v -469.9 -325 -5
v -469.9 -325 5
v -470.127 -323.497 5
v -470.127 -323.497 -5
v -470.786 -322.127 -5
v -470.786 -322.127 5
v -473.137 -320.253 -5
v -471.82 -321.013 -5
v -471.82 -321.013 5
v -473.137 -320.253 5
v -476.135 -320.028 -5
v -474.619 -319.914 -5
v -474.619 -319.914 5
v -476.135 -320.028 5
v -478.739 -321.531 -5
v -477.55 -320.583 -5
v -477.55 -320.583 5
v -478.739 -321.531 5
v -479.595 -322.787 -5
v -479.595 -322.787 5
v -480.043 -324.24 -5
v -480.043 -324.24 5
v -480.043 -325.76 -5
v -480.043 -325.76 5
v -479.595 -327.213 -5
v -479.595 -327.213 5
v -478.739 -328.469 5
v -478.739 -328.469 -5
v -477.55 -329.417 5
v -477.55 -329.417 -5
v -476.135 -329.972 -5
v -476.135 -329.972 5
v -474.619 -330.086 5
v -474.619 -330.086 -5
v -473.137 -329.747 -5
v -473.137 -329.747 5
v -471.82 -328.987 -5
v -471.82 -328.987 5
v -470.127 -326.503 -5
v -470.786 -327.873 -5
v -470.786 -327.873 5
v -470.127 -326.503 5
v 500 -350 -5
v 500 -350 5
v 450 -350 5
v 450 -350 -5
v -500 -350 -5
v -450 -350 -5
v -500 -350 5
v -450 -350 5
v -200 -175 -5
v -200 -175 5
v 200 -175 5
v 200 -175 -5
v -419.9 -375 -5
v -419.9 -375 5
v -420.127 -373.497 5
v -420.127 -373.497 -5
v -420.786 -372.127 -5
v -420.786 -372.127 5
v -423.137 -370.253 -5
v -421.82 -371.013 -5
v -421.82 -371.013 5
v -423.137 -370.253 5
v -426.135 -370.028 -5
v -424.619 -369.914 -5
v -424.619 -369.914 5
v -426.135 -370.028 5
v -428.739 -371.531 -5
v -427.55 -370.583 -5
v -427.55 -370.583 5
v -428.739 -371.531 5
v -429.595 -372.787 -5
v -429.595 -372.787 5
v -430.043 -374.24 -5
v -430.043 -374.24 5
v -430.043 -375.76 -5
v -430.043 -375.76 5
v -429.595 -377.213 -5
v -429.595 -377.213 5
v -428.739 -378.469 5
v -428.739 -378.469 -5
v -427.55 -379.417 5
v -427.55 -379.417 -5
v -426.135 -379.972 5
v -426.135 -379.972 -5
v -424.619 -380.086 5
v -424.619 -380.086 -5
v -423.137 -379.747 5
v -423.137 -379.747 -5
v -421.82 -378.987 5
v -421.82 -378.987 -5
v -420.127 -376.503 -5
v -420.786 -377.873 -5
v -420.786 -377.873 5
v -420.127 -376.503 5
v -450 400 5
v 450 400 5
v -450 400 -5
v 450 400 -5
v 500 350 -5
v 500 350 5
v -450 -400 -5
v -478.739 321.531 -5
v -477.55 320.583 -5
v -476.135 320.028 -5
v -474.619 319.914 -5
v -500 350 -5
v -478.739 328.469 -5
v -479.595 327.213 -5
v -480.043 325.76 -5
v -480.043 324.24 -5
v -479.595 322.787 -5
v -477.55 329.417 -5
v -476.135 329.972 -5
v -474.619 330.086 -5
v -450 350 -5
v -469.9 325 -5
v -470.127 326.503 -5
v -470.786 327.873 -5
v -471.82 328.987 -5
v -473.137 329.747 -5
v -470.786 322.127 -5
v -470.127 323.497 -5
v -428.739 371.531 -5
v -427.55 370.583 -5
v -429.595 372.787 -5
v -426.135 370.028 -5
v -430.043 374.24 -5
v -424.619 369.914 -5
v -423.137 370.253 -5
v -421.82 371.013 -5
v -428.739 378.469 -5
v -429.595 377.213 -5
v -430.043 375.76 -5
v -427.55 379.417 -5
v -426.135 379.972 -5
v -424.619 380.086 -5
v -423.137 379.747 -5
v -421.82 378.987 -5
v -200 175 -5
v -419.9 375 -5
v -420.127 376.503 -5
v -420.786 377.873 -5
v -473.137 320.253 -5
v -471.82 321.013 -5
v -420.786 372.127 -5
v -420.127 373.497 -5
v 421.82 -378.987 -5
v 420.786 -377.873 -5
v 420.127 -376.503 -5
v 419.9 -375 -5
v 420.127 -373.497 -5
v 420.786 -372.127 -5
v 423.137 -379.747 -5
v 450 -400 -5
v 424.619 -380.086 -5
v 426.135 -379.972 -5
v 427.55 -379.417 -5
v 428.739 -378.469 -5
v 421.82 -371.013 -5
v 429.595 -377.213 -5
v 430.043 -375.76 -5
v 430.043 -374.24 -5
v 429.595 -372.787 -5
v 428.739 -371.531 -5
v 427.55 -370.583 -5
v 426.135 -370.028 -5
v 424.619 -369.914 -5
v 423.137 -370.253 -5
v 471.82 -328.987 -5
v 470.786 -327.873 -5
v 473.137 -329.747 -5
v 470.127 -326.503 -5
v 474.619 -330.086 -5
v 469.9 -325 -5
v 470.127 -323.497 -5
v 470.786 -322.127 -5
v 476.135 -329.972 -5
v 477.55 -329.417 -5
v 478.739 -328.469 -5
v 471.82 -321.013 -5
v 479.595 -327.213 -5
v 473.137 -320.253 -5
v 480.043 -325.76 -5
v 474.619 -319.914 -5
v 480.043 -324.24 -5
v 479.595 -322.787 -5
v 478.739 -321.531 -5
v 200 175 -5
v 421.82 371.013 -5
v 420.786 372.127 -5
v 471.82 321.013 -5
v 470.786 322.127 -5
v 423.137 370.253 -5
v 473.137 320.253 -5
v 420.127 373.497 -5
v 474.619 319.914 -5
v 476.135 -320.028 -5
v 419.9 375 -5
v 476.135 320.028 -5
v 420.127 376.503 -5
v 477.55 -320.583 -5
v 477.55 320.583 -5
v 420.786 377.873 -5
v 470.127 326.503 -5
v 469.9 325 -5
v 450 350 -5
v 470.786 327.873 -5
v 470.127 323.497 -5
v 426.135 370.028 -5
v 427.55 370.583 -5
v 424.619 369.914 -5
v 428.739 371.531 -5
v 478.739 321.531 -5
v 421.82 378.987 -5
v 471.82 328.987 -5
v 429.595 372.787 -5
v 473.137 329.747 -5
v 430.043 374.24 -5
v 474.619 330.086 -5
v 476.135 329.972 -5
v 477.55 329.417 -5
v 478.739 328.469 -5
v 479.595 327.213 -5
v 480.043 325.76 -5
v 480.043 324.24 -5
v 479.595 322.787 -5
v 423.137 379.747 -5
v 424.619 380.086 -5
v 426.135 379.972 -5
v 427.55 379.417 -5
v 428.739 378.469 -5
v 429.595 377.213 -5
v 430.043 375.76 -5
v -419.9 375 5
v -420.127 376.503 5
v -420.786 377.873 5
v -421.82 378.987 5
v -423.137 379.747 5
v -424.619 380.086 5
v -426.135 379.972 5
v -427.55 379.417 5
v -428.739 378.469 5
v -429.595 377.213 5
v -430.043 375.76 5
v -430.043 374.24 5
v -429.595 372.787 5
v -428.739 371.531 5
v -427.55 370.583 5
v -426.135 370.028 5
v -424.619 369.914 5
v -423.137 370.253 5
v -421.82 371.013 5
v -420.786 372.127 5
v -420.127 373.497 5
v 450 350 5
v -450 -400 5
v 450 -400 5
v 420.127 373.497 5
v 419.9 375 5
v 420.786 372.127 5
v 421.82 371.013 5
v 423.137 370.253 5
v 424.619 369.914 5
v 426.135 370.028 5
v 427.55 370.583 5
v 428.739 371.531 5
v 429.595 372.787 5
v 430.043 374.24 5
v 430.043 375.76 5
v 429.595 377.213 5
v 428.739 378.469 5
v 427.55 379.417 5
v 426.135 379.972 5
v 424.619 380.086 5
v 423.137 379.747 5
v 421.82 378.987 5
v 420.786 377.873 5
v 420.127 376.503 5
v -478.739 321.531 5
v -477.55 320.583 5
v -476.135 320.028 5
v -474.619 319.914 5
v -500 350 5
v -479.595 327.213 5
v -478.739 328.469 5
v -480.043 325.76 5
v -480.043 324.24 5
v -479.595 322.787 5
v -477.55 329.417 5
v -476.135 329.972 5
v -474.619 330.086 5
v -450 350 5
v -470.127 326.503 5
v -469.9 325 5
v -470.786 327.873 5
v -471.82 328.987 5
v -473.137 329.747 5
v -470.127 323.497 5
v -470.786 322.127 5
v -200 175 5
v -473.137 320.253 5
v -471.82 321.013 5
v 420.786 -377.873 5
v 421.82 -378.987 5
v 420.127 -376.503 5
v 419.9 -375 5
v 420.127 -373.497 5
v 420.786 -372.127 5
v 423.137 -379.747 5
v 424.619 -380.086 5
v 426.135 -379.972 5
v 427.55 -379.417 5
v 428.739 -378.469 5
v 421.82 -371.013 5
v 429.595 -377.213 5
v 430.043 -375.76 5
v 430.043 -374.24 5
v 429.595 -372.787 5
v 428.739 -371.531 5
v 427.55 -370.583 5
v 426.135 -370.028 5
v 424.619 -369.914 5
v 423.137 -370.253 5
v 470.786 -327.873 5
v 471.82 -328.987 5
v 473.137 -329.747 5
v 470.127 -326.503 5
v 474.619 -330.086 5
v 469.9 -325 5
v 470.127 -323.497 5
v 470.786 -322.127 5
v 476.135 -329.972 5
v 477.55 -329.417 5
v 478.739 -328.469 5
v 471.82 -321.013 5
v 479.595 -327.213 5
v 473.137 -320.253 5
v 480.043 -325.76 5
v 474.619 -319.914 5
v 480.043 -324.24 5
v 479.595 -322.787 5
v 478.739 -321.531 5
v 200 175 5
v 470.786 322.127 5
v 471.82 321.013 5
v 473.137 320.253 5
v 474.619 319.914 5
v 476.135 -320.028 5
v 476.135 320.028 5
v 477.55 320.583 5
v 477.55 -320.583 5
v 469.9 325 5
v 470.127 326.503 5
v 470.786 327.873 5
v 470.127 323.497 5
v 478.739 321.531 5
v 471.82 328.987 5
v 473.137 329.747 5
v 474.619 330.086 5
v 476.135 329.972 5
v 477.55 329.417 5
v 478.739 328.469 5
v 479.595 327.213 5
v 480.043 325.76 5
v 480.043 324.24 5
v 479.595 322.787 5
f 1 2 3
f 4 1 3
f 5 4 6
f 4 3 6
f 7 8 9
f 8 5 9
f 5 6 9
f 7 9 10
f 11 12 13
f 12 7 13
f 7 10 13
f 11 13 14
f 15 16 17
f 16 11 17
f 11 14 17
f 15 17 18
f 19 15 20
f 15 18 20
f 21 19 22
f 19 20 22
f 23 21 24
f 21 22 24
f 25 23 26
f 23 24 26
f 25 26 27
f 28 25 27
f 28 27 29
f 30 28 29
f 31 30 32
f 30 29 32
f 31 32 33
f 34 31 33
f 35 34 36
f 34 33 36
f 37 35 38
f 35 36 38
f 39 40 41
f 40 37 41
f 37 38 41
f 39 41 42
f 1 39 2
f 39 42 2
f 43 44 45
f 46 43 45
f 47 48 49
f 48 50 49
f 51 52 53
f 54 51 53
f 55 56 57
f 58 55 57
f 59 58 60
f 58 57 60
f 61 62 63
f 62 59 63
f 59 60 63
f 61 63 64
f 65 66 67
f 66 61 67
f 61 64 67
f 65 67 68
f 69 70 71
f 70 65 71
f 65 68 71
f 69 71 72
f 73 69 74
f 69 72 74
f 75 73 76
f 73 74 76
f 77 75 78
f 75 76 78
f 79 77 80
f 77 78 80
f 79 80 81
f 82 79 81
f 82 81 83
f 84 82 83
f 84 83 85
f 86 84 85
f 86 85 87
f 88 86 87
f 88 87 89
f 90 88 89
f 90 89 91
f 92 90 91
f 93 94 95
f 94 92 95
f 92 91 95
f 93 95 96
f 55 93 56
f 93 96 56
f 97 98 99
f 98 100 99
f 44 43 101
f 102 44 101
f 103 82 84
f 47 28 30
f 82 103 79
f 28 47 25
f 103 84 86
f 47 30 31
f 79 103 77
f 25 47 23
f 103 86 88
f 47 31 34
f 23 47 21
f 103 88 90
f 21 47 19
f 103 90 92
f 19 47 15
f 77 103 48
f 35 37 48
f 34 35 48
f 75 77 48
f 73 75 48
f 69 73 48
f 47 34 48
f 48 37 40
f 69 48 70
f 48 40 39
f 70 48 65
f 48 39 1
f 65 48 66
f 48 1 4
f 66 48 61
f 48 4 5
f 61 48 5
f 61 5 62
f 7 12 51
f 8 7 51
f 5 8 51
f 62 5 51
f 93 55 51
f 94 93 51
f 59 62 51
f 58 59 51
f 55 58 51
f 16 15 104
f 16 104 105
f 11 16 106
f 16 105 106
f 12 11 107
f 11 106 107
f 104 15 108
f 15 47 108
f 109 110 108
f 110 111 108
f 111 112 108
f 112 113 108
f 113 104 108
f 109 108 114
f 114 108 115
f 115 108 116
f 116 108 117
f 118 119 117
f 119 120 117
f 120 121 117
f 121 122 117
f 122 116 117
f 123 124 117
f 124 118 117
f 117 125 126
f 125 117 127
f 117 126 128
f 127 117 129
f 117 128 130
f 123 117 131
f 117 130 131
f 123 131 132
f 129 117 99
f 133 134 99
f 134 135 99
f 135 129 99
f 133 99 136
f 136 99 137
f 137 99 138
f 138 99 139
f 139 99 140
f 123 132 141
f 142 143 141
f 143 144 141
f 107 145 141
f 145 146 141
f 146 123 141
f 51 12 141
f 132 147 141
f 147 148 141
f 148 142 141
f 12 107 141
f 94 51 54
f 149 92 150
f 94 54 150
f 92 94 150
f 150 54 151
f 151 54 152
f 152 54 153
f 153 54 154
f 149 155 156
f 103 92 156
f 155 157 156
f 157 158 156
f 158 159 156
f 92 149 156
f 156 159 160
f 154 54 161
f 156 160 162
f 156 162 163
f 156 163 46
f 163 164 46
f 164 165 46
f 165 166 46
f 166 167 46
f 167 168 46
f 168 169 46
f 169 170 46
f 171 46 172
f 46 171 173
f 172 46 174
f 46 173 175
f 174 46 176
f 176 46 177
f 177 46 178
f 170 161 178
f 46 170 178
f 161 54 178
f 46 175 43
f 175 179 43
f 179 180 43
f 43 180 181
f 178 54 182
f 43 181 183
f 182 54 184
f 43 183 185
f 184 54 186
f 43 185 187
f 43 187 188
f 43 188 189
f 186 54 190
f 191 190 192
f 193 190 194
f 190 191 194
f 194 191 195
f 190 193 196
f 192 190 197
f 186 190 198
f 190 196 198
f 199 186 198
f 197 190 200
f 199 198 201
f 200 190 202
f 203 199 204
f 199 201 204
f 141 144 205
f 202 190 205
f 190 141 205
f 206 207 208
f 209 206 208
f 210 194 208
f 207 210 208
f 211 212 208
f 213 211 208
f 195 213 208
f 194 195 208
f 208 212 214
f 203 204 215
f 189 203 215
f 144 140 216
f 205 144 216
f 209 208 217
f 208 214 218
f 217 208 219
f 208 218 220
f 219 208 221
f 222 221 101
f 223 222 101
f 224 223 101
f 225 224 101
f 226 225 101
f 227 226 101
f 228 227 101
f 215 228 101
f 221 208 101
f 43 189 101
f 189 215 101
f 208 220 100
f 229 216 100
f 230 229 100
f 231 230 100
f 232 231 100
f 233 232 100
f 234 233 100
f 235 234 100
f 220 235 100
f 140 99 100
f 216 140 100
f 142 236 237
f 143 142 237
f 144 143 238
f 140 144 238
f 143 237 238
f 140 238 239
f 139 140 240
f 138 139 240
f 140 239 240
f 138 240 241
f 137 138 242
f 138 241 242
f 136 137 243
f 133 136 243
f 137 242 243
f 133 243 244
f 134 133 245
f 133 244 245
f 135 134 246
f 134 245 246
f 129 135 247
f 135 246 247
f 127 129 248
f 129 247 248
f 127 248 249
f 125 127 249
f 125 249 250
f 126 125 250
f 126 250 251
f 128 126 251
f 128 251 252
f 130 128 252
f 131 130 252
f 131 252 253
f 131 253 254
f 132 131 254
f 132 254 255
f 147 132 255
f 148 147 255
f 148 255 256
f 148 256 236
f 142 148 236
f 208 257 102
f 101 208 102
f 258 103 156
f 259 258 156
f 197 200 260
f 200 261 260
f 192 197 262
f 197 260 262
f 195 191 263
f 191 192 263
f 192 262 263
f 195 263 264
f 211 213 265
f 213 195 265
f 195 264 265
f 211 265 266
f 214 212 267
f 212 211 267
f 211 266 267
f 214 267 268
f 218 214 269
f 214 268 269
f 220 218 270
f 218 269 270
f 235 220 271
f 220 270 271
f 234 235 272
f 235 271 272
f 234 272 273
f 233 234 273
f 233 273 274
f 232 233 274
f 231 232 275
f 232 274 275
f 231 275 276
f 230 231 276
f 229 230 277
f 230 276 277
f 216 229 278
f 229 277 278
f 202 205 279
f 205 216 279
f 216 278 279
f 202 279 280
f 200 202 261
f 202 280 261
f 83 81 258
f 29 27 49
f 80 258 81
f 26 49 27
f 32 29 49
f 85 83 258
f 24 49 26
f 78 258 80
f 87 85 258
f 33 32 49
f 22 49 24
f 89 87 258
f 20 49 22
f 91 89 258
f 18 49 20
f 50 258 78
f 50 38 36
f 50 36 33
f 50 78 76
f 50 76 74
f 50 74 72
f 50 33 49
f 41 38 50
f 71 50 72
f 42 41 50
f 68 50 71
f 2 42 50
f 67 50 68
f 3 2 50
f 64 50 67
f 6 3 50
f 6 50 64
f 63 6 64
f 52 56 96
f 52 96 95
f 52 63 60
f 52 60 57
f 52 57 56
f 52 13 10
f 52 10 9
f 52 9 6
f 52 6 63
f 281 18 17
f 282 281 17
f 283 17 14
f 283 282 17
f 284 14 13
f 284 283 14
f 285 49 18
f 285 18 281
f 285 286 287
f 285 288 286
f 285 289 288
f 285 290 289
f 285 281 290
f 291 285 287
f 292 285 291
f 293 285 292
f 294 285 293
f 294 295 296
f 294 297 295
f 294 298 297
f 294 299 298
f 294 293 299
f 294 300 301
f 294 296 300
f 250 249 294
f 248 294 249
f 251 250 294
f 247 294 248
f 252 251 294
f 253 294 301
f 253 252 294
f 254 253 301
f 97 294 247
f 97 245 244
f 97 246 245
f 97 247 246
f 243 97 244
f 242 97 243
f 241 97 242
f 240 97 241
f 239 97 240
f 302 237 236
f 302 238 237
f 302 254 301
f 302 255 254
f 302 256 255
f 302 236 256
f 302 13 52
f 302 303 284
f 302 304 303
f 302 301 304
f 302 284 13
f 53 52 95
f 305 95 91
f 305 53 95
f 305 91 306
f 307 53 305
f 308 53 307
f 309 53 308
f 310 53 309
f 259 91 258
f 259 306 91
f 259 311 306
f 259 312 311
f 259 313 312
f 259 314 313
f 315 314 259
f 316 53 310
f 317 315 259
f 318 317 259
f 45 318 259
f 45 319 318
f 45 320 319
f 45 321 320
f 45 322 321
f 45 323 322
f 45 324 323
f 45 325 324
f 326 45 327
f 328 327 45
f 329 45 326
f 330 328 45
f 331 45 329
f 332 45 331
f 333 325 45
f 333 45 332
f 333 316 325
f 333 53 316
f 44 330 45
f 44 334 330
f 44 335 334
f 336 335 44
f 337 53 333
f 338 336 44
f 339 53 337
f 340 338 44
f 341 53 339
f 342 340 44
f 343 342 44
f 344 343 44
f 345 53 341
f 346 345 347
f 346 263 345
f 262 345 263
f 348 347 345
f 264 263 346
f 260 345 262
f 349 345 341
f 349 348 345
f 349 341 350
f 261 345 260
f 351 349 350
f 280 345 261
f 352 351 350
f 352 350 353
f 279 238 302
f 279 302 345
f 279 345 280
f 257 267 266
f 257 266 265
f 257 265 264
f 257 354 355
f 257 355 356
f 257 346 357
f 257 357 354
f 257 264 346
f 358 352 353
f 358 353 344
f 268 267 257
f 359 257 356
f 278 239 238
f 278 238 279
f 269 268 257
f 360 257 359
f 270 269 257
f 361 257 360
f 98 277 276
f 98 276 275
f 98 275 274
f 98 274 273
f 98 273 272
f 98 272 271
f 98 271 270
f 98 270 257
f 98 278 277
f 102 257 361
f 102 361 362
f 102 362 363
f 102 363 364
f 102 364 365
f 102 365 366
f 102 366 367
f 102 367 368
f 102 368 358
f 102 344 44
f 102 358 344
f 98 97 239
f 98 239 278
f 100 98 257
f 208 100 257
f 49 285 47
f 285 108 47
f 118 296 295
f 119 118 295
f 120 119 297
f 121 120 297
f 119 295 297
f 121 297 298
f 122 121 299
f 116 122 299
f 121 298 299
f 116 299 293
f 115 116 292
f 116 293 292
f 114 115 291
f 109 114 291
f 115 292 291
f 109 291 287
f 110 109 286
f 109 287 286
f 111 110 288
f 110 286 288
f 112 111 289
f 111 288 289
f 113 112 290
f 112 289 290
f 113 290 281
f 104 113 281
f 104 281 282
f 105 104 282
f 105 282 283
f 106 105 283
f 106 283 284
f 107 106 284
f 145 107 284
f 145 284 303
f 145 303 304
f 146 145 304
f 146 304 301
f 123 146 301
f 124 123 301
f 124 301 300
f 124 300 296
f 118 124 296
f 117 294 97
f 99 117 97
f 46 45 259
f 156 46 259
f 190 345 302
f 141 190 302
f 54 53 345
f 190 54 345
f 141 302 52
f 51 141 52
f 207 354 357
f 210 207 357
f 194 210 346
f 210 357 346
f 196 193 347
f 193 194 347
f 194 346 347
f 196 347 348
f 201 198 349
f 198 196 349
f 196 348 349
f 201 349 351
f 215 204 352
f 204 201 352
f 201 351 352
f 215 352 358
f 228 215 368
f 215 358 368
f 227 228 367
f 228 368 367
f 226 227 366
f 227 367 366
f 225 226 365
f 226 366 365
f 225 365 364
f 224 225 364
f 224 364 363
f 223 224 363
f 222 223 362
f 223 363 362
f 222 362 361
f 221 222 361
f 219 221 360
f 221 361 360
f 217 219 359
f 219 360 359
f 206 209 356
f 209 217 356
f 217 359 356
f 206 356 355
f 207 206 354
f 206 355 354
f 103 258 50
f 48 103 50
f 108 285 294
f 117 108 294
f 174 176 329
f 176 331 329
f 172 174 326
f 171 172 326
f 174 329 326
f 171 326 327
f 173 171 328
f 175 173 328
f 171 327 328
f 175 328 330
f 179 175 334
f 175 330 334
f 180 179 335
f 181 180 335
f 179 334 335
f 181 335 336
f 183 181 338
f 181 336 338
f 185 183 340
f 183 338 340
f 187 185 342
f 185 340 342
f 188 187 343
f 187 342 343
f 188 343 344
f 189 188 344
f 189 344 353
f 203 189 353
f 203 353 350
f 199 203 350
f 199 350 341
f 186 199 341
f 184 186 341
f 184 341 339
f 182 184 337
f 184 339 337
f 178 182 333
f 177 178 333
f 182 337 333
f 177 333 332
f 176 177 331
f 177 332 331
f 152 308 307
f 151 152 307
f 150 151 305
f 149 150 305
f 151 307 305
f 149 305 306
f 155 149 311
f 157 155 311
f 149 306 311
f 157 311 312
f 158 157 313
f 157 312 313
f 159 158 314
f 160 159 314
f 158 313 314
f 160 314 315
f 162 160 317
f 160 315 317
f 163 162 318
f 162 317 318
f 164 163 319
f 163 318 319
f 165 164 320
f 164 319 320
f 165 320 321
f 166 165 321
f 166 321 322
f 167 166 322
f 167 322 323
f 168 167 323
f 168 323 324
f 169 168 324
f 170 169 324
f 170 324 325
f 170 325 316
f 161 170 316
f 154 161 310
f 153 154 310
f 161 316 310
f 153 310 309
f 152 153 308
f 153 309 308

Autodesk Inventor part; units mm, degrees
ref_plane "YZ Plane" through (0, 0, 0) normal (1, 0, 0) x (0, 1, 0)
ref_plane "XZ Plane" through (0, 0, 0) normal (0, 1, 0) x (-1, 0, 0)
ref_plane "XY Plane" through (0, 0, 0) normal (0, 0, 1) x (1, 0, 0)
sketch "Sketch3" plane through (0, 0, 0) normal (0, 0, 1) x (1, 0, 0)
  line L0 (-500, -400) -> (500, -400)
  line L1 (500, -400) -> (500, 400)
  line L2 (500, 400) -> (-500, 400)
  line L3 (-500, 400) -> (-500, -400)
  line L4 (-500, -400) -> (500, 400) construction
  line L5 (500, -400) -> (-500, 400) construction
  point P0 (0, 0)
  dimension "d9" = 1000
  dimension "d10" = 800
extrude "Plate2" add sketch "Sketch3" along normal mid plane 10
sketch "Sketch4" plane through (0, 0, 5) normal (0, 0, 1) x (1, 0, 0)
  line L0 (-200, -175) -> (200, -175)
  line L1 (200, -175) -> (200, 175)
  line L2 (200, 175) -> (-200, 175)
  line L3 (-200, 175) -> (-200, -175)
  line L4 (-200, -175) -> (200, 175) construction
  line L5 (200, -175) -> (-200, 175) construction
  point P0 (0, 0)
  dimension "d12" = 400
  dimension "d13" = 350
extrude "Cut2" cut sketch "Sketch4" against normal blind 10
sketch "Sketch7" plane through (0, 0, 5) normal (0, 0, 1) x (1, 0, 0)
  line L0 (-450, 400) -> (-500, 400)
  line L1 (-500, 400) -> (-500, 350)
  line L2 (-500, 350) -> (-450, 350)
  line L3 (-450, 350) -> (-450, 400)
  line L4 (-450, 400) -> (-500, 350) construction
  line L5 (-500, 400) -> (-450, 350) construction
  circle A0 centre (-425, 375) radius 5.1
  circle A1 centre (-475, 325) radius 5.1
  point P0 (0, 0)
  point P1 (-475, 375)
  point P2 (-475, 375)
  point P3 (-475, 375)
  dimension "d20" = 50
  dimension "d21" = 50
  dimension "d26" = 10.2
  dimension "d27" = 25
  dimension "d28" = 25
extrude "Cut4" cut sketch "Sketch7" against normal blind 10
mirror "Mirror5" about plane through (0, 0, 0) normal (0, 1, 0) of "Cut4"
mirror "Mirror6" about plane through (0, 0, 0) normal (1, 0, 0) of "Cut4", "Mirror5"
equation "\"d14\" = Thickness"
equation "\"d21\" = d20"
equation "\"d28\" = d27"
equation "\"d22\" = Thickness"
equation "\"d11\" = Thickness"
equation "\"BendReliefDepth\" = 0.5 * Thickness"
equation "\"Thickness\" = 10"
properties part number "Chapa-0001-001" material "Steel, Galvanized"
